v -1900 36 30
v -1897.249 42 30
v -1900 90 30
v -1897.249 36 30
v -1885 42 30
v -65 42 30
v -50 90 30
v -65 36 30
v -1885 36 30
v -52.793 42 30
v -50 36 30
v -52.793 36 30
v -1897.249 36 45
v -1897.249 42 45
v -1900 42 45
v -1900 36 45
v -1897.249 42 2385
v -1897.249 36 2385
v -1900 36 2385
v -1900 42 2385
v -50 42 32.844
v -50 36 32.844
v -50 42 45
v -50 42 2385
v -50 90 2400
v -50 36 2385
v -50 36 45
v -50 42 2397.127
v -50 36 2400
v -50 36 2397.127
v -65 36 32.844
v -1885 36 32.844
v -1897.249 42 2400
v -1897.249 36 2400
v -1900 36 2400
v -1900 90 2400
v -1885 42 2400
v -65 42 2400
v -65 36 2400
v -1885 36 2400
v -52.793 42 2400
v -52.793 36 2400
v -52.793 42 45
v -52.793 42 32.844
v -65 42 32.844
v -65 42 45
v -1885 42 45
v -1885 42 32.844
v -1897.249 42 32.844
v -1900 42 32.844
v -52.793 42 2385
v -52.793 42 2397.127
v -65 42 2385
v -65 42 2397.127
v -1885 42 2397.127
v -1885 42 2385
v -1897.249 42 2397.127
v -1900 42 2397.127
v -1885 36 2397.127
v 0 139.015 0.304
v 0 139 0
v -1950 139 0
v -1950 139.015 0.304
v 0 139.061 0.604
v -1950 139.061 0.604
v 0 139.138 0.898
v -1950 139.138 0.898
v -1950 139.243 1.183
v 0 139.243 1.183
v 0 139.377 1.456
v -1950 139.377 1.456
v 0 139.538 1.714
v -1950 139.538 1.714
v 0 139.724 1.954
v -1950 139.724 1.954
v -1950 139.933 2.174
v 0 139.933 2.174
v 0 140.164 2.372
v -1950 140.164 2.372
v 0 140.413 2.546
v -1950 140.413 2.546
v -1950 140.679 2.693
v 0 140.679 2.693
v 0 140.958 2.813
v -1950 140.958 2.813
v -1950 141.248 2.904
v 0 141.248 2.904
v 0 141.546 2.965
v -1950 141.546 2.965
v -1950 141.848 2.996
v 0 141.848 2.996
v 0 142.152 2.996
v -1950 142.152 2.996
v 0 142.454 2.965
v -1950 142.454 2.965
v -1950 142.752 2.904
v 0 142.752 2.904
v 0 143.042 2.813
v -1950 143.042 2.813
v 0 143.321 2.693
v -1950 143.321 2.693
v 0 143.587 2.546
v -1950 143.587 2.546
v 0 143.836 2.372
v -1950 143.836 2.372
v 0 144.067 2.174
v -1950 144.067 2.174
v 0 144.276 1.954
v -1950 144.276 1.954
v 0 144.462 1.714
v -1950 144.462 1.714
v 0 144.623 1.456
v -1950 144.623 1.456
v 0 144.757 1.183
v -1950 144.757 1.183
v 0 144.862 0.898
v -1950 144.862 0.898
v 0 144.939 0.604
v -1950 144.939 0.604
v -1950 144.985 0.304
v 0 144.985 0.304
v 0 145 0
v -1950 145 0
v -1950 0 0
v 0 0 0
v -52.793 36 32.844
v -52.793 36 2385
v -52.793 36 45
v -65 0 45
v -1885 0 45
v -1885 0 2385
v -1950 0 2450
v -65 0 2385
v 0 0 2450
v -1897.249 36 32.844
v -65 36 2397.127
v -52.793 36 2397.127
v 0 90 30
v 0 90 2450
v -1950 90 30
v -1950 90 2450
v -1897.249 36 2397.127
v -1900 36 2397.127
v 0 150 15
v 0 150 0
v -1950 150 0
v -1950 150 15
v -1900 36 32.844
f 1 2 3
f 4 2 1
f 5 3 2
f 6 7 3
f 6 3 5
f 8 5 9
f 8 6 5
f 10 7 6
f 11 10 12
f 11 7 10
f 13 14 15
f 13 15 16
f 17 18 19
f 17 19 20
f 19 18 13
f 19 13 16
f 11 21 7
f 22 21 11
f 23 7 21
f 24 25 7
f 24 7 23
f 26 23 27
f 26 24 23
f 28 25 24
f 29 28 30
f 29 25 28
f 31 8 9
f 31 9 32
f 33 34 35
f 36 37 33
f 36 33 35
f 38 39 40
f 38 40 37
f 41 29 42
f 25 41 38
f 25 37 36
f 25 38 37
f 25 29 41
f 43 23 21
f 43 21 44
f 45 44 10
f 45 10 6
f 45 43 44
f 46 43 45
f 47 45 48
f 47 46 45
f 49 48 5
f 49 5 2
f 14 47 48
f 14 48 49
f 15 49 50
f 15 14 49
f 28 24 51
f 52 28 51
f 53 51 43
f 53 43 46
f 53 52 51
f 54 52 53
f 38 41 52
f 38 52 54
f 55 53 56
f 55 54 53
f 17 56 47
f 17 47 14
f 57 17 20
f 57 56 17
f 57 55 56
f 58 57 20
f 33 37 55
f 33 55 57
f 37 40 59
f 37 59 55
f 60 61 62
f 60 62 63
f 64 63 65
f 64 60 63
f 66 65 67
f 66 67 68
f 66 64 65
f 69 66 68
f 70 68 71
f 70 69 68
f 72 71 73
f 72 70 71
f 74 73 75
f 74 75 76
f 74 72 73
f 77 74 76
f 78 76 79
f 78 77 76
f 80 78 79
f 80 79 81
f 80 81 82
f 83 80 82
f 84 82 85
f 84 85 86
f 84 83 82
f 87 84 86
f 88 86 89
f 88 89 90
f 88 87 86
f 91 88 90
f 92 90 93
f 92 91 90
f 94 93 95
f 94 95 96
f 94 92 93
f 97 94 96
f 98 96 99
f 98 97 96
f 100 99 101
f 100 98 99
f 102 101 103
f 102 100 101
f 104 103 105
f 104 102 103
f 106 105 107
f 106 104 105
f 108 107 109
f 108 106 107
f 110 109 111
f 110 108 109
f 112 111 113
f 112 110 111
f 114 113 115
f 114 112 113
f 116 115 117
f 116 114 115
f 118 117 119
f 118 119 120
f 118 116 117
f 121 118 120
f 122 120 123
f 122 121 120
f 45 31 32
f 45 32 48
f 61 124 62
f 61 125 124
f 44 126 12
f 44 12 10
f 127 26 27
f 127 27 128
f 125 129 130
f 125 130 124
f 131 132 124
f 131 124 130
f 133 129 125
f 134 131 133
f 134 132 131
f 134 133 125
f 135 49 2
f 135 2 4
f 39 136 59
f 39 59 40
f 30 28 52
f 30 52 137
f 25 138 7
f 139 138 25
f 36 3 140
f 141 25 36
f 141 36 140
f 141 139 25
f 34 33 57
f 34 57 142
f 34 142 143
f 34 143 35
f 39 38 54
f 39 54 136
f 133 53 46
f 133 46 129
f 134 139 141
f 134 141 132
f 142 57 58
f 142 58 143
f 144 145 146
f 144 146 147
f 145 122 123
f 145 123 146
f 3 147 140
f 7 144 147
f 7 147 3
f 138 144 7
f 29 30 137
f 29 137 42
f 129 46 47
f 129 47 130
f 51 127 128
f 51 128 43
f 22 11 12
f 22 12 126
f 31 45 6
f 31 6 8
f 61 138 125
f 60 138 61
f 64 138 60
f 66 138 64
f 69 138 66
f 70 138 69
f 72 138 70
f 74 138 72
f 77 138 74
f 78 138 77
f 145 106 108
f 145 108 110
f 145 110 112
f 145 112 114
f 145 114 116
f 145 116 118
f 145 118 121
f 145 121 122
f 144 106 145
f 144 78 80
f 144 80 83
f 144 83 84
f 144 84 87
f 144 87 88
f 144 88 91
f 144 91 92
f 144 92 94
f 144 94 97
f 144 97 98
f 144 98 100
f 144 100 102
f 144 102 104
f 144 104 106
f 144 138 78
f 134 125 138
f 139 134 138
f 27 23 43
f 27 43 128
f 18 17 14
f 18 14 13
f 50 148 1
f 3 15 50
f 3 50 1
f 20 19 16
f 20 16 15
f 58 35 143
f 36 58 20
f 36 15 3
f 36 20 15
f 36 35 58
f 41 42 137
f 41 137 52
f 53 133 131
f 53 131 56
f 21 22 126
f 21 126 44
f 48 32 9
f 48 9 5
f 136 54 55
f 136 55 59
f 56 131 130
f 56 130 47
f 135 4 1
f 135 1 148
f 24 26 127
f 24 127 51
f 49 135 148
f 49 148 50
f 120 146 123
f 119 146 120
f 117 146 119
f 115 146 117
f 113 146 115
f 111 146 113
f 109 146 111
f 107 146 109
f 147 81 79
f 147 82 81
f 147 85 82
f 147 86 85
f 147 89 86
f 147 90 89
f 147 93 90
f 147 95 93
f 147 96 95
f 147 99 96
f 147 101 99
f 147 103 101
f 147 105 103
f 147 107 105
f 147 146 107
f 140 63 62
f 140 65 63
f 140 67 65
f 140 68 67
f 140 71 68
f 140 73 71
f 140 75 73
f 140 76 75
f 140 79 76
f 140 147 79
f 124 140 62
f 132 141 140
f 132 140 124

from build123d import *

# Parameters (mm, degrees)
F1_DEPTH = 1950
F3_DEPTH = 2450


with BuildPart() as f1:
    # F0 (on Right) → F1 (new body)
    with BuildSketch(Plane.YZ):
        with BuildLine():
            Line((150, 0), (150, 15))
            Line((150, 15), (90, 30))
            Line((90, 30), (42, 30))
            Line((42, 30), (36, 30))
            Line((36, 30), (36, 32.8440852463))
            Line((36, 32.8440852463), (42, 32.8440852463))
            Line((42, 32.8440852463), (42, 45))
            Line((42, 45), (0, 45))
            Line((0, 45), (0, 0))
            Line((0, 0), (139, 0))
            ThreePointArc((139, 0), (142, 3), (145, 0))
            Line((145, 0), (150, 0))
        make_face()
    extrude(amount=-F1_DEPTH)



with BuildPart() as f1b:
    # F0 (on Right) → F1, piece 2 (new body)
    with BuildSketch(Plane.YZ):
        Polygon((90, 2450), (0, 2450), (0, 2385), (42, 2385), (42, 2397.1269130707), (36, 2397.1269130707), (36, 2400), (42, 2400), (90, 2400), align=None)
    extrude(amount=-F1_DEPTH)


with BuildPart() as f1_1:
    add(f1.part)

    add(f1b.part)  # F3 merges F1b
    # F2 (on face) → F3 (join)
    with BuildSketch(Plane.XY.offset(2450)):
        Polygon((-1950, 90), (-1950, 0), (-1885, 0), (-1885, 42), (-1897.2488641739, 42), (-1897.2488641739, 36), (-1900, 36), (-1900, 42), (-1900, 90), align=None)
        Polygon((-65, 0), (0, 0), (0, 90), (-50, 90), (-50, 42), (-50, 36), (-52.7931936085, 36), (-52.7931936085, 42), (-65, 42), align=None)
    extrude(amount=-F3_DEPTH)


solid = f1_1.part
